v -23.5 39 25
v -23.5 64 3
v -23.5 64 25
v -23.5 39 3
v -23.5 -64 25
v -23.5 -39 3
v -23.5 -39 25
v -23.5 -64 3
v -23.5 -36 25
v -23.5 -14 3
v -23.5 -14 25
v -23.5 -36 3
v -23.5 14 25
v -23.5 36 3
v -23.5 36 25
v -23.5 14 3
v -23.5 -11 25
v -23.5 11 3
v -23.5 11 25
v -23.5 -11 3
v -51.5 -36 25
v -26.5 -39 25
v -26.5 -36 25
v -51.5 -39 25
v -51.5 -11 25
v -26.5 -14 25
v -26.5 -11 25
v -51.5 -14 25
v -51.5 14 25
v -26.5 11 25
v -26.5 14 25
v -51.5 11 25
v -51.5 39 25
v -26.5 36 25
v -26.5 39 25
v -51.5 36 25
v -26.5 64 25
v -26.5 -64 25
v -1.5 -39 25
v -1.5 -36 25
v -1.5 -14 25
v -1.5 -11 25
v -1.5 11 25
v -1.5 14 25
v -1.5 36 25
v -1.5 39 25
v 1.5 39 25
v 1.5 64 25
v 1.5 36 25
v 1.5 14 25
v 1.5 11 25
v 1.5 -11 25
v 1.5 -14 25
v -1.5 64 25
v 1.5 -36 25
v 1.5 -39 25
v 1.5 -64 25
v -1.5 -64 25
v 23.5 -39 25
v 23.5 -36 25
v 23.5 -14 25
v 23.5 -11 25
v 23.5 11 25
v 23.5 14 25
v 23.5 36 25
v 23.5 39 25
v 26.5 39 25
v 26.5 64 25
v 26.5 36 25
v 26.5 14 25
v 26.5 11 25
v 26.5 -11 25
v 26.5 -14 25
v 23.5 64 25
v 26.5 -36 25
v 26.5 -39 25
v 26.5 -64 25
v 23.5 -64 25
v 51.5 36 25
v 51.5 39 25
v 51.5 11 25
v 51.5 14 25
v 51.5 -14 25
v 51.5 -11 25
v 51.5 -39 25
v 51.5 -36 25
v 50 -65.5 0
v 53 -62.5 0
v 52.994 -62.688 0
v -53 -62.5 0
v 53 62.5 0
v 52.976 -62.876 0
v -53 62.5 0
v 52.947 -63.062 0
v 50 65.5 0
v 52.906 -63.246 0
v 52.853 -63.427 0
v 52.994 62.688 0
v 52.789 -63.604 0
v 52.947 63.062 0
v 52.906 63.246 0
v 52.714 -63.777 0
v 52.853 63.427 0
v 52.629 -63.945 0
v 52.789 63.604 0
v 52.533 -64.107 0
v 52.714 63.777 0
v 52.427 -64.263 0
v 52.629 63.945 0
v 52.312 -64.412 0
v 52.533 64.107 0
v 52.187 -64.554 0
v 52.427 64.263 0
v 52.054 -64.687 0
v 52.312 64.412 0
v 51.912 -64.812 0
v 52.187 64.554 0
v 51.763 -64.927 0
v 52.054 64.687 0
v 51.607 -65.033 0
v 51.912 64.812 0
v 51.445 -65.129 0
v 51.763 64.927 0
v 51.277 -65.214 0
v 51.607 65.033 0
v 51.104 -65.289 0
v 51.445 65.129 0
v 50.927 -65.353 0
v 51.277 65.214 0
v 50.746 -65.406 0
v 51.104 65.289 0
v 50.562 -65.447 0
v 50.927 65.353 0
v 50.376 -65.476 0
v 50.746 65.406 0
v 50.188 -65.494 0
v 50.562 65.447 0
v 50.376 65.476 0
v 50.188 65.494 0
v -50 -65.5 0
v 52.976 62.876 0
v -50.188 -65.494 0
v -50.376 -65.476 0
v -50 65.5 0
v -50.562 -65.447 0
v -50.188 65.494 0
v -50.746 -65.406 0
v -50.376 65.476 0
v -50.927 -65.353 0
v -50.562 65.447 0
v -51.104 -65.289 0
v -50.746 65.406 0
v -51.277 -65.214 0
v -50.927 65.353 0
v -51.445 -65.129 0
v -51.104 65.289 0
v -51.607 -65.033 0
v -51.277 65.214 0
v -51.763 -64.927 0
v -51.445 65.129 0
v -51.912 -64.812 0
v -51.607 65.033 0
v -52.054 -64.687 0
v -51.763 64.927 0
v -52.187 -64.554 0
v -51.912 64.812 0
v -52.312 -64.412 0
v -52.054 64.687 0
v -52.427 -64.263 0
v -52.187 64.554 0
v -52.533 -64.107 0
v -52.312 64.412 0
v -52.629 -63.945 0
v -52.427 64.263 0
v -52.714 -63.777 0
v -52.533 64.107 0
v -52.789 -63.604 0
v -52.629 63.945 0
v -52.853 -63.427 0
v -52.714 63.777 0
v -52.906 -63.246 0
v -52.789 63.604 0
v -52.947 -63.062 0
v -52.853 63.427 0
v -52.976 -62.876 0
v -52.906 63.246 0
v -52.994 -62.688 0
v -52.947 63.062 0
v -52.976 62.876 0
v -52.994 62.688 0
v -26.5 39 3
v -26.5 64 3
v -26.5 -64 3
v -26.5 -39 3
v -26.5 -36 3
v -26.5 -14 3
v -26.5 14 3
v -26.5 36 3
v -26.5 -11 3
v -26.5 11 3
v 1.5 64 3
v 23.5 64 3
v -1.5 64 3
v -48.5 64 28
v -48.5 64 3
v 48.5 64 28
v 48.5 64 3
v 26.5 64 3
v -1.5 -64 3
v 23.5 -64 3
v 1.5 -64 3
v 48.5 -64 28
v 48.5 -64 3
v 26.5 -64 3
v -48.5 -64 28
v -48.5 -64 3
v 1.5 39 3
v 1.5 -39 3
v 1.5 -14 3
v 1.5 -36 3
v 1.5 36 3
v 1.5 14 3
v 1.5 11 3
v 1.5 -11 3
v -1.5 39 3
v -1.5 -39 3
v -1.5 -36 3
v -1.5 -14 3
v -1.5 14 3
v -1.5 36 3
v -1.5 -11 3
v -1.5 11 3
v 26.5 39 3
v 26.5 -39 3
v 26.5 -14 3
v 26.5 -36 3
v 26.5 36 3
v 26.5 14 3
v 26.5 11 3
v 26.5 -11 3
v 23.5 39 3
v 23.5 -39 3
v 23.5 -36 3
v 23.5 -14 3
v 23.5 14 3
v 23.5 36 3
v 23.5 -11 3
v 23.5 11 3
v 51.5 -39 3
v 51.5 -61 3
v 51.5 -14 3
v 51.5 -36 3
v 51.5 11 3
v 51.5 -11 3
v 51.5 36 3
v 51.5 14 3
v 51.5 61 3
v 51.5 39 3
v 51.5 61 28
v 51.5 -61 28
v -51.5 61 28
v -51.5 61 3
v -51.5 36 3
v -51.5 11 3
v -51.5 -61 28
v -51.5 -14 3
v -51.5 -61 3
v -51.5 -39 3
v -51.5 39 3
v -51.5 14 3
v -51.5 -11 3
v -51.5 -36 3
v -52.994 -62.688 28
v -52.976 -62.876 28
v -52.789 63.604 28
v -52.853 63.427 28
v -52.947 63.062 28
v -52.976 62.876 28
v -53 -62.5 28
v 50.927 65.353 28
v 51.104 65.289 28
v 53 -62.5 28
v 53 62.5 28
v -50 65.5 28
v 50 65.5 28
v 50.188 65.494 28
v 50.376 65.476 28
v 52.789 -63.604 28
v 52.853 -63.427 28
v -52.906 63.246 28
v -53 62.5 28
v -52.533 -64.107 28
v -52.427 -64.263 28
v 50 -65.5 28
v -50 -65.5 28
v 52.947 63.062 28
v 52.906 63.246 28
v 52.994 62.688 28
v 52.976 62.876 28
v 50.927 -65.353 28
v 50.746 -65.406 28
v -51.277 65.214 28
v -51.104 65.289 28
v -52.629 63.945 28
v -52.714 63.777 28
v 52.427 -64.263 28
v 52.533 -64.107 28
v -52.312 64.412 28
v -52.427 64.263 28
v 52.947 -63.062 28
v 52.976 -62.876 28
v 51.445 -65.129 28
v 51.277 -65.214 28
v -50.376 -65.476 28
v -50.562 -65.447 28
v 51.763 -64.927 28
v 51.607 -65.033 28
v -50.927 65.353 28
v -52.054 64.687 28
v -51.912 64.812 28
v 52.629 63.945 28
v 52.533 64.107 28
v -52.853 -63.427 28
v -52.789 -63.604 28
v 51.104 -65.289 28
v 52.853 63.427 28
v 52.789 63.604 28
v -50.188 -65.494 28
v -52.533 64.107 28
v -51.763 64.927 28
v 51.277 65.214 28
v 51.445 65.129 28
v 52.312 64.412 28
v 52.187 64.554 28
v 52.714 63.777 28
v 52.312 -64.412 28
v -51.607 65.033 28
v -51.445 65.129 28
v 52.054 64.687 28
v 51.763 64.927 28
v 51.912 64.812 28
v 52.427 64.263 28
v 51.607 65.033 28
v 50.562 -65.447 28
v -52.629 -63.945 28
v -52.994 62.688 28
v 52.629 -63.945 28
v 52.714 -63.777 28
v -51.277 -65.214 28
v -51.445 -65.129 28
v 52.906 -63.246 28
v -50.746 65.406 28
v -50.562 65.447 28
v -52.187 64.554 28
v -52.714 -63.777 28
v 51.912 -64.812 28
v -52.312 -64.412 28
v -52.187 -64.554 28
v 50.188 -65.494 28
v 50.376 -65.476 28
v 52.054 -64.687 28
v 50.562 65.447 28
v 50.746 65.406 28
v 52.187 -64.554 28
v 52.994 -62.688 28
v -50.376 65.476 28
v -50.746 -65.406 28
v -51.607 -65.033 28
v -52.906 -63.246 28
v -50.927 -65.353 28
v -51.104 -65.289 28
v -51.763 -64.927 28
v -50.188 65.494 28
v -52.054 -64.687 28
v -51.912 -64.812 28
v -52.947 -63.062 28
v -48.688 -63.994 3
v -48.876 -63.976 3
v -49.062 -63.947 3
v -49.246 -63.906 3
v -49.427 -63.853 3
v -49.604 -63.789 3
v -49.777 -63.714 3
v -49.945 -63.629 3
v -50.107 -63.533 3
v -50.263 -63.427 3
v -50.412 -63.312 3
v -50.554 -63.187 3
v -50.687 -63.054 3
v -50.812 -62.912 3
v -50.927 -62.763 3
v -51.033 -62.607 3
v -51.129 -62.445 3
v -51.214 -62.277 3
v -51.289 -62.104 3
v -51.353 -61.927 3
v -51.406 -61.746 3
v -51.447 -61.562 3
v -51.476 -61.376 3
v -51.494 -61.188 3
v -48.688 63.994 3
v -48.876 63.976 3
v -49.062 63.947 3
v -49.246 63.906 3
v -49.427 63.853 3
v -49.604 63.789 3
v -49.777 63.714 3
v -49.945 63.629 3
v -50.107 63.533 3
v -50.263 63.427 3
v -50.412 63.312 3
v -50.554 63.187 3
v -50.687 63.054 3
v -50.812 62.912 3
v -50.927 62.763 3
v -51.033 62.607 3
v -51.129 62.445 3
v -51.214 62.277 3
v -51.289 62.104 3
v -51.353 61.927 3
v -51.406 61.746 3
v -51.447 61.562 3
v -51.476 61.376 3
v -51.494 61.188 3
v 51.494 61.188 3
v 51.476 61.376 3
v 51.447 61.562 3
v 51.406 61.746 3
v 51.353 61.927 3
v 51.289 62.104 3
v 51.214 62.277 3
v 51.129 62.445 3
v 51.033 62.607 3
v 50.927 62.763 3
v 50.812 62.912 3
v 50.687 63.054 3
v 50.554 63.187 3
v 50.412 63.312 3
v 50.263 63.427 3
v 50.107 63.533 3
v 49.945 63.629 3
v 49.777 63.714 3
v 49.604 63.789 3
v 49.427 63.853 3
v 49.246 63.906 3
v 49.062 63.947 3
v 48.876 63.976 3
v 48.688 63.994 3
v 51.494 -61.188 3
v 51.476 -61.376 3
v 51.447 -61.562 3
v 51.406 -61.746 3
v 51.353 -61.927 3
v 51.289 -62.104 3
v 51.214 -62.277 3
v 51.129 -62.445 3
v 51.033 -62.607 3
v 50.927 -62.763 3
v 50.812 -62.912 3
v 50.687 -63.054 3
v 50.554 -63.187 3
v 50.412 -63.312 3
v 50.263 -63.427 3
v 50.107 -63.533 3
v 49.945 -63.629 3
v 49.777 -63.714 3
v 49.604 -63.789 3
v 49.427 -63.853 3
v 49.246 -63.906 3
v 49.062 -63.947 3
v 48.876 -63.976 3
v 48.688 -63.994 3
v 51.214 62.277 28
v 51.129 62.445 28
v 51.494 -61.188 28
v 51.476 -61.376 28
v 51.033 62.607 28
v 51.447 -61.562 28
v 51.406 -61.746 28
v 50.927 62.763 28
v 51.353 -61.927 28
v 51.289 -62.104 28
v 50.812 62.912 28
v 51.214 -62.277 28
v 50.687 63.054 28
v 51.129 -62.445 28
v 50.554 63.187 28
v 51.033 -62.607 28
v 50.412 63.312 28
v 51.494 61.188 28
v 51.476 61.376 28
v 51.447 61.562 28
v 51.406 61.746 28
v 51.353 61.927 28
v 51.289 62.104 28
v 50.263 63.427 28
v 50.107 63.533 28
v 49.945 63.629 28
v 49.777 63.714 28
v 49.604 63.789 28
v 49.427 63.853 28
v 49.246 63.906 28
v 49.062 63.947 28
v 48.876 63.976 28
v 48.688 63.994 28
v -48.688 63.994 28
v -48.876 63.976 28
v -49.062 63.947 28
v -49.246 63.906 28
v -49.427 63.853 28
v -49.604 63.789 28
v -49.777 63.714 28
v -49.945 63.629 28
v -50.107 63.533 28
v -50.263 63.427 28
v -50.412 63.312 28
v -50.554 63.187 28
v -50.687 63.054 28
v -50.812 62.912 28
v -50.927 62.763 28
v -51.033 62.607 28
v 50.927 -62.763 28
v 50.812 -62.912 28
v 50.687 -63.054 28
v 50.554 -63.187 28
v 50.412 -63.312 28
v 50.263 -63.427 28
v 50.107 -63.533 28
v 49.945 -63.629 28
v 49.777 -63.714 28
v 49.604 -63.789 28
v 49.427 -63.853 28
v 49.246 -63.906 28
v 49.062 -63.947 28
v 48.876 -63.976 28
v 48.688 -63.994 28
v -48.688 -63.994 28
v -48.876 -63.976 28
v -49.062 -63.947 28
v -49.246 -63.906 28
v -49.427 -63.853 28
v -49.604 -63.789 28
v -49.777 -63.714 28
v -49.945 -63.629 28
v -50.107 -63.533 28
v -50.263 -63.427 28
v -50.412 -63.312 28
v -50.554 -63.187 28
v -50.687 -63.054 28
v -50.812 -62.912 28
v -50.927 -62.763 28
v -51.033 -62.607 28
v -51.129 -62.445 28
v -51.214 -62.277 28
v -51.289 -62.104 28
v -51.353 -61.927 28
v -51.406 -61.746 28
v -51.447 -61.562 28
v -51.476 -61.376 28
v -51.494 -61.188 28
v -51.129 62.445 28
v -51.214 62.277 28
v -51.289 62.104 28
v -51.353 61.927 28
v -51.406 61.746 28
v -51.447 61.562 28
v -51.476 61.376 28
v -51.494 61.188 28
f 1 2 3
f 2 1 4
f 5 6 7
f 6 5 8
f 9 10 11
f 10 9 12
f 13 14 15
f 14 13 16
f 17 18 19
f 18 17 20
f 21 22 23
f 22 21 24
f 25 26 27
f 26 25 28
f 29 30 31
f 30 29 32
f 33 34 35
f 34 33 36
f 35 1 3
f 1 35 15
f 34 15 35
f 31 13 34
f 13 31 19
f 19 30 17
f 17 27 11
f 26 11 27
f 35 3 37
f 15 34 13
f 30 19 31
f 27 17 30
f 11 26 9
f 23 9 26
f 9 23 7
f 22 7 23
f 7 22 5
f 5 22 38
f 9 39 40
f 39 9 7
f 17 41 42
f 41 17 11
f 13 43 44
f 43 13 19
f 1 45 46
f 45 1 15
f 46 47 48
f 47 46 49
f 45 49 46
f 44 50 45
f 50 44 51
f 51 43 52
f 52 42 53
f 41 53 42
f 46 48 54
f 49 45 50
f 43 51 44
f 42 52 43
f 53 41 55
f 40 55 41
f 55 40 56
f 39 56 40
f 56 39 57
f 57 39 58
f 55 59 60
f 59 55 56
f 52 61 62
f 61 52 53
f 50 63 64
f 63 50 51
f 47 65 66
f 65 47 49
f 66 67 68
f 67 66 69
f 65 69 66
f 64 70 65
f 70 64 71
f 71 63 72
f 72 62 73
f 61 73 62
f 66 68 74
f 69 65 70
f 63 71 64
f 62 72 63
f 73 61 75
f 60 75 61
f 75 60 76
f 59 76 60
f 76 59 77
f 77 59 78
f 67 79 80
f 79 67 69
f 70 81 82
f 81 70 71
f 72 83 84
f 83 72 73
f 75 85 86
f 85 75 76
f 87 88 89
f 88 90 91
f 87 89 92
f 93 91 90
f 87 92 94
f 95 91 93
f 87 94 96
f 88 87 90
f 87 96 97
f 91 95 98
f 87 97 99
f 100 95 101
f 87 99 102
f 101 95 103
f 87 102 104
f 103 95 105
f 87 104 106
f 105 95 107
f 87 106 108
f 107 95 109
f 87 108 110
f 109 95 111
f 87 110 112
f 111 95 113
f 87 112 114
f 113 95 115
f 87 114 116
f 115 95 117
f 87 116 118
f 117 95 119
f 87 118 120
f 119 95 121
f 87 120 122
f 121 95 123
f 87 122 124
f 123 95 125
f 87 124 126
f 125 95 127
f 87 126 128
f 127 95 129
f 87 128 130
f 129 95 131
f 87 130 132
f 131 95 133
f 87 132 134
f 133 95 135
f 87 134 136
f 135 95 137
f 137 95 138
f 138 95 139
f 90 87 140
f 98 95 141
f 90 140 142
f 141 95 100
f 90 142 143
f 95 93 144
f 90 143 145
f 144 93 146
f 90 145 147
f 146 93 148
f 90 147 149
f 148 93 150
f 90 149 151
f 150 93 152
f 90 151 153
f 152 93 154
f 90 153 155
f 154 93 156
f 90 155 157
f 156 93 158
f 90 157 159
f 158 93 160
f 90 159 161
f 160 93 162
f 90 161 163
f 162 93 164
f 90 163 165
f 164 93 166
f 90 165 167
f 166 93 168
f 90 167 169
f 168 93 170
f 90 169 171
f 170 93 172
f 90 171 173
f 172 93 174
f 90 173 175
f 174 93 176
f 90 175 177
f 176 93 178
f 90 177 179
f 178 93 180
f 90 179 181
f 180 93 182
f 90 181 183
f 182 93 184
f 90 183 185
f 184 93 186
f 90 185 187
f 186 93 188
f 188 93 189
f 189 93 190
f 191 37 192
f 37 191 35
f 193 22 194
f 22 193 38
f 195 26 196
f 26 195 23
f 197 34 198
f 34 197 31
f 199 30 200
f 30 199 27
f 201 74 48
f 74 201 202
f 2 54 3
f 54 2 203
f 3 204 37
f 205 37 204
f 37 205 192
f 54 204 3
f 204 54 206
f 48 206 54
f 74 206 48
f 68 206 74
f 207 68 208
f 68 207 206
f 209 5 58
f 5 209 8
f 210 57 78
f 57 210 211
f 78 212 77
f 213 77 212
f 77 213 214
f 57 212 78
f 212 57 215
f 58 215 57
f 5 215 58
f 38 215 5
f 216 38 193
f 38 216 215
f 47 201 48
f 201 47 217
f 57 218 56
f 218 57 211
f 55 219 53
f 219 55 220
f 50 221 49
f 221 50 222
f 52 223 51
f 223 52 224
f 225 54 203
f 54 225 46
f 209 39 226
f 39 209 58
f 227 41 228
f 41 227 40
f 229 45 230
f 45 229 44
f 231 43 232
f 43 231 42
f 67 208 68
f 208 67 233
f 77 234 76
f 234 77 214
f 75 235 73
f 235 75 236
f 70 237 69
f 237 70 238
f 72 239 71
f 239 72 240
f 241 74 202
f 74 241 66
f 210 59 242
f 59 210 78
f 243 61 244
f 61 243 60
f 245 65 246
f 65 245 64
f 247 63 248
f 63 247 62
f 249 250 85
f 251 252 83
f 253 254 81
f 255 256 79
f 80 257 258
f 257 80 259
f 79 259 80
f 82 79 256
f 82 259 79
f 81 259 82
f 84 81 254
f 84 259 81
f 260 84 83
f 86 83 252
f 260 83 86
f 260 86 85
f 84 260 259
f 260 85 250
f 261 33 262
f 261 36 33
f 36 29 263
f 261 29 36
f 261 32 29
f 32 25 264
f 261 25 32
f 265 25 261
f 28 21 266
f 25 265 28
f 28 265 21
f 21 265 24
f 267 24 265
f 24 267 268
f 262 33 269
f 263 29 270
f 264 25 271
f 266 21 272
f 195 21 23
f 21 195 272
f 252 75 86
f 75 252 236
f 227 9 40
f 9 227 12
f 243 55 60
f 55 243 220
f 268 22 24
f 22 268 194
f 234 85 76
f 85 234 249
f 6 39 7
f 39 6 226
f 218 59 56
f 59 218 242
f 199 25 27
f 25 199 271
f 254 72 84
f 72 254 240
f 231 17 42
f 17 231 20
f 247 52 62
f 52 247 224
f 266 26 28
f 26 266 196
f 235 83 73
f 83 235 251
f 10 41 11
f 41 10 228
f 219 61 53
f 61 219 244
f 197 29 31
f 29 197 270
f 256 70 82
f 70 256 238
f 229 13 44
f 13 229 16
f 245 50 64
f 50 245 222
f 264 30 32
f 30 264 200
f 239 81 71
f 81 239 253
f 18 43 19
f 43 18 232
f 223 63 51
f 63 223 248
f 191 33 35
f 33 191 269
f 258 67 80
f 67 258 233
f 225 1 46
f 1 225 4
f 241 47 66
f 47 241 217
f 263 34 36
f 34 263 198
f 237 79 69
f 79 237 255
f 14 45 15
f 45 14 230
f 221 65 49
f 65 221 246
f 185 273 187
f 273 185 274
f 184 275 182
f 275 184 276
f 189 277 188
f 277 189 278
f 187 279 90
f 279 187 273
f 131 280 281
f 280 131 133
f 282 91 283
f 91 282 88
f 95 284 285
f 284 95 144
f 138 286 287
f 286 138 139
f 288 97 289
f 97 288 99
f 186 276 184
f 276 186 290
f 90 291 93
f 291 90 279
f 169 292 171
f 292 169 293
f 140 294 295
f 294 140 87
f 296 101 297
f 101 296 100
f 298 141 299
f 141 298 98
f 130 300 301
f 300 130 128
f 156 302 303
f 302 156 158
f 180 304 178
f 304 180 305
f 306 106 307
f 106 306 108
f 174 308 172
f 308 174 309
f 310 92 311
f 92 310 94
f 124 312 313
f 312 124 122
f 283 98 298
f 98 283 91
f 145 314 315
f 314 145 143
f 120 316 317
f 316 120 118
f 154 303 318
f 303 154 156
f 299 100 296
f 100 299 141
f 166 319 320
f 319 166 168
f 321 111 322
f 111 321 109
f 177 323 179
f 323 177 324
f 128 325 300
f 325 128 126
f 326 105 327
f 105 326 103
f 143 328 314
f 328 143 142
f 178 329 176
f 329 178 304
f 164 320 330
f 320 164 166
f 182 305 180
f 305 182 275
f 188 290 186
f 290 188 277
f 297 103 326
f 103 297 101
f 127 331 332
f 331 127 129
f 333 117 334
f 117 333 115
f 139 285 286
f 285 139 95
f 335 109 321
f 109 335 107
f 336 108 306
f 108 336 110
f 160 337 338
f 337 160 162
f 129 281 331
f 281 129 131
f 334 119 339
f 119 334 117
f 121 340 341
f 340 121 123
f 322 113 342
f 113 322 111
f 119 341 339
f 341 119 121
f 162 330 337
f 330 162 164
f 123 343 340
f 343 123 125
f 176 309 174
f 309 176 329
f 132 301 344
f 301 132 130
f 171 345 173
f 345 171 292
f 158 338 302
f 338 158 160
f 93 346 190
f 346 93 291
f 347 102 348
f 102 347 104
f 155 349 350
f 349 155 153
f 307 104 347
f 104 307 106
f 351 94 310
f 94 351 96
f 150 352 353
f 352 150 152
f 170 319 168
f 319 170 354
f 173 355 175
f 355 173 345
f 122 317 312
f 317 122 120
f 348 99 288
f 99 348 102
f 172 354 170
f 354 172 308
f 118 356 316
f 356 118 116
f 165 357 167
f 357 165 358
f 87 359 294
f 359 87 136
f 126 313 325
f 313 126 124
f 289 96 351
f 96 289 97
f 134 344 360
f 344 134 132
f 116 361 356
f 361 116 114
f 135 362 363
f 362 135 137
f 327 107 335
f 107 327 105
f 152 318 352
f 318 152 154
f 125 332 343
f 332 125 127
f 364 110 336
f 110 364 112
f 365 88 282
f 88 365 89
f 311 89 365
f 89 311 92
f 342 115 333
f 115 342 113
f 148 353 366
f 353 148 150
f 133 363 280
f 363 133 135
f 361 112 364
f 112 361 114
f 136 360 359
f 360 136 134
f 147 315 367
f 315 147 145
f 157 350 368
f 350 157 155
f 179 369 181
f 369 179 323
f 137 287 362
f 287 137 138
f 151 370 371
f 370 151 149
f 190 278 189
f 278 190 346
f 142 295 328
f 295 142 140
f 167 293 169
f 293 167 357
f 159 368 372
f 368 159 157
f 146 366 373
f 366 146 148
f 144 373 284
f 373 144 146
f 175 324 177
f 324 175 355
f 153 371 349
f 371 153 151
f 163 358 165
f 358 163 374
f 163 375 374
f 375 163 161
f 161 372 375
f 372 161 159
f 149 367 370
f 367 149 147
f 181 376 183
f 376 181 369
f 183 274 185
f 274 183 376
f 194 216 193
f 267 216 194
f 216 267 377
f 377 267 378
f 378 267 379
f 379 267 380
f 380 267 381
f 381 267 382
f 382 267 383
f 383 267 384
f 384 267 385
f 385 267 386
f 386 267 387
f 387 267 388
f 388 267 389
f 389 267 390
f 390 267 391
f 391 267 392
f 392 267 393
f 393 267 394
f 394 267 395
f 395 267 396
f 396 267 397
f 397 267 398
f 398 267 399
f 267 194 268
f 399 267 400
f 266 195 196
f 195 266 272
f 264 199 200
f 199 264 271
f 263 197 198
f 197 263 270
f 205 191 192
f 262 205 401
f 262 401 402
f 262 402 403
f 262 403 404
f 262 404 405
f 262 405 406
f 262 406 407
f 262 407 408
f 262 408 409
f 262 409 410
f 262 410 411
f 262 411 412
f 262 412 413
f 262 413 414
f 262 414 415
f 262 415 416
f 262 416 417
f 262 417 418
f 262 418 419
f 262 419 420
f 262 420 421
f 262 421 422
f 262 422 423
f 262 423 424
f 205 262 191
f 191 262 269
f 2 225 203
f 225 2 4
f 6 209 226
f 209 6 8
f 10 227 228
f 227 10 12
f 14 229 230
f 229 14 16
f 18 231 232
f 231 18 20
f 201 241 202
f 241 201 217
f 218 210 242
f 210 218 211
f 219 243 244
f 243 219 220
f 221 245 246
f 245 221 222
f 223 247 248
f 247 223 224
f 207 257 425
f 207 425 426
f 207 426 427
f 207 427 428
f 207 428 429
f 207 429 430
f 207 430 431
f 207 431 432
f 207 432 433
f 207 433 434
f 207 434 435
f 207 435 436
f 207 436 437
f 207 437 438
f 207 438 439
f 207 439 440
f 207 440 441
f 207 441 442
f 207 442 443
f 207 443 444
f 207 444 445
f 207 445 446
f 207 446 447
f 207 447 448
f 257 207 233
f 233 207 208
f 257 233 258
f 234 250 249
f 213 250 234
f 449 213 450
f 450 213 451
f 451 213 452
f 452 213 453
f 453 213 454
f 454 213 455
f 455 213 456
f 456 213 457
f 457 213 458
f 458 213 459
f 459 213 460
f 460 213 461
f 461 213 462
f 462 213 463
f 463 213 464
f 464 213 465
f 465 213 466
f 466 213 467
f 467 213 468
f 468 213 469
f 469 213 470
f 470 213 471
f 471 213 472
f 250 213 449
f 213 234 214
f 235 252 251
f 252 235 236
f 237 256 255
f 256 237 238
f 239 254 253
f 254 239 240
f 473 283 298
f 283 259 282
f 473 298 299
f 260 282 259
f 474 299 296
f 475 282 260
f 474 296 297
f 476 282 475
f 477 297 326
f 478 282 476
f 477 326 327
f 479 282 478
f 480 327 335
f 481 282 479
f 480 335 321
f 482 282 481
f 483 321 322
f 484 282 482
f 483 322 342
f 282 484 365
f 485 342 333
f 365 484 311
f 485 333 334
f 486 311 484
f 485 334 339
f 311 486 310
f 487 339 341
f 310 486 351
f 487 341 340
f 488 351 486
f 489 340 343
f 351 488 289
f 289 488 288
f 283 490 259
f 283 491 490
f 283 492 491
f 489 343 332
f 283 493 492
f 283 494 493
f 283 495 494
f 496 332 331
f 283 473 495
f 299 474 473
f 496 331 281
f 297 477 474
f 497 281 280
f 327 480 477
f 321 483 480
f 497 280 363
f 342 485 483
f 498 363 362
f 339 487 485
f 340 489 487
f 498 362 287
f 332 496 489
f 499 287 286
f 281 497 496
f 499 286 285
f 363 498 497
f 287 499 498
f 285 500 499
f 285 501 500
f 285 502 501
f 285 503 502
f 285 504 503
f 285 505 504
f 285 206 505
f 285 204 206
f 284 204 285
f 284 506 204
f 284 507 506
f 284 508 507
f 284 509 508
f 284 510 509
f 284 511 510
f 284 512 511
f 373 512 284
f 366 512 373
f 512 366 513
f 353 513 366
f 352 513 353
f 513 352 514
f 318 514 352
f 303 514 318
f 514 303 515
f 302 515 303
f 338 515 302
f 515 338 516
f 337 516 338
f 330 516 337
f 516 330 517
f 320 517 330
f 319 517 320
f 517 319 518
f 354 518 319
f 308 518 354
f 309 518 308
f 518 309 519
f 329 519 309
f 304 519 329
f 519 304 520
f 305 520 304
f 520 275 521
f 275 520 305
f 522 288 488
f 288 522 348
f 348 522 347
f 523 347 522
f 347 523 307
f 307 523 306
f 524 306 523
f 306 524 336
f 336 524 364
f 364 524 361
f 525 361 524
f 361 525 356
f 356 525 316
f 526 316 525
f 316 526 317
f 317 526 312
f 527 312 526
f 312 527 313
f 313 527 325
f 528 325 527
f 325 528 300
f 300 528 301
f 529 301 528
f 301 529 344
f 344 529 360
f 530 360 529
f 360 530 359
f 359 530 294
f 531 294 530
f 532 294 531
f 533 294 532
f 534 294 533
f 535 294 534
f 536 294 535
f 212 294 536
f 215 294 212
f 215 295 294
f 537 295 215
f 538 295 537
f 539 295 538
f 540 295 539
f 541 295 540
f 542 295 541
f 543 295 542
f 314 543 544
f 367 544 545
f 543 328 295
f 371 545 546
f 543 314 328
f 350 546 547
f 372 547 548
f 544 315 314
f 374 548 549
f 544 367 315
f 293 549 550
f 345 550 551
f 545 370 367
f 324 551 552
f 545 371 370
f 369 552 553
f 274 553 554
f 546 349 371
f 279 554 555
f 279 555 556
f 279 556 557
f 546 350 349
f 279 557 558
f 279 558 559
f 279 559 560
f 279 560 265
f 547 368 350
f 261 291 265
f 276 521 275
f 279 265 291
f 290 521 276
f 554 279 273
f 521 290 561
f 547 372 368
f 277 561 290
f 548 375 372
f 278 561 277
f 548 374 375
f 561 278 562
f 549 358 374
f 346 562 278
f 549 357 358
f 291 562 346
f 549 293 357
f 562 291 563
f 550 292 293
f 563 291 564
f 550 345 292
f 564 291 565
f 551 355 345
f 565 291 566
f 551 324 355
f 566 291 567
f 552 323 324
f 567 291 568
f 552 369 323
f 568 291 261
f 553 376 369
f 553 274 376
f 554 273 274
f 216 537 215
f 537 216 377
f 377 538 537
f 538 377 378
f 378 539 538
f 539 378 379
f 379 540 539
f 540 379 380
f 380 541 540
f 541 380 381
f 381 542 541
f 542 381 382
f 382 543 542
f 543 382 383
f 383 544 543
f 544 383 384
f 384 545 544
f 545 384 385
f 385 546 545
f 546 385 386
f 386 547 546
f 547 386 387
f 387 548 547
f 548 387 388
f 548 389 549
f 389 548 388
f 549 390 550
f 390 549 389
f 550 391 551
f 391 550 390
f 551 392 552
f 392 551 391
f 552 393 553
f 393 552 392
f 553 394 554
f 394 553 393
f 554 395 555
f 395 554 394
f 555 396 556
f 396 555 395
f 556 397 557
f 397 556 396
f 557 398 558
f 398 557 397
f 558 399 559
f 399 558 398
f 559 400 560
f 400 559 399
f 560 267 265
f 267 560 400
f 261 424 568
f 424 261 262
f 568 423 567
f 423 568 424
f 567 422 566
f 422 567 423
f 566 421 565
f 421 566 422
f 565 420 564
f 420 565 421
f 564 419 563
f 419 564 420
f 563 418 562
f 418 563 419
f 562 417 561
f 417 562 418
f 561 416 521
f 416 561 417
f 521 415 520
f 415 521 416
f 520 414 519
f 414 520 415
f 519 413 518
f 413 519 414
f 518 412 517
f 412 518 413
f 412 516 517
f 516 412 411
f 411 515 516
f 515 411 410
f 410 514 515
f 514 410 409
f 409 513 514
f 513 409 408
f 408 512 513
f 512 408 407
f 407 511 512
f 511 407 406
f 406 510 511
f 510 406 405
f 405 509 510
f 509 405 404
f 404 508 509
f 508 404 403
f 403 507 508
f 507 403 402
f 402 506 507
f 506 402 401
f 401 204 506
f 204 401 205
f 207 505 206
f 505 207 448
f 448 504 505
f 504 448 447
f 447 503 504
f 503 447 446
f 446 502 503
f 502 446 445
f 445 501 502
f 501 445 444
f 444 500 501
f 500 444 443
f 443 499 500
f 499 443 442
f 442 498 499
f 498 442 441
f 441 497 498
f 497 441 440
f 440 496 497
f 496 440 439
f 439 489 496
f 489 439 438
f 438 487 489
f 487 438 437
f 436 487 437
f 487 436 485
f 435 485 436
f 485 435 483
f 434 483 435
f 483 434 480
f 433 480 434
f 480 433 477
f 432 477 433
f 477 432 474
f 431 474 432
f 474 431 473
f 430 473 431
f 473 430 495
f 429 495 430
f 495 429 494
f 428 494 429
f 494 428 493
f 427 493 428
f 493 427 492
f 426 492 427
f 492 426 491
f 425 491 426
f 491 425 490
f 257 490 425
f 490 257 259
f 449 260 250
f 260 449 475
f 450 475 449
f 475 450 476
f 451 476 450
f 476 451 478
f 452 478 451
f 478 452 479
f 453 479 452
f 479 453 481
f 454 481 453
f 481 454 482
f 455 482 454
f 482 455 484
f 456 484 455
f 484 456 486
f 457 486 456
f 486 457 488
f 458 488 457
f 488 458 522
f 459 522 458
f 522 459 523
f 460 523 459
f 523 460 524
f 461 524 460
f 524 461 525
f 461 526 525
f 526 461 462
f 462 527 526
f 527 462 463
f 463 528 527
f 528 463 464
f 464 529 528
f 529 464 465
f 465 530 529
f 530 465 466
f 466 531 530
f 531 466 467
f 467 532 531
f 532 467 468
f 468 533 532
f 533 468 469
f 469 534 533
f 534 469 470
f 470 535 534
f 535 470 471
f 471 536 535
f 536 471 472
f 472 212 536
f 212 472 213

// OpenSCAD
$fn = 100;

rows = 5;
cols = 4;

width = 25;
length = 25;
height = 25;

module tray_base(width, length, height, thickness, radius) {
  linear_extrude(height) {
    hull() {
      w = width - radius + thickness;
      l = length - radius + thickness;

      points = [[-w/2, -l/2],
		[ w/2, -l/2],
		[ w/2,  l/2],
		[-w/2,  l/2]];
      for (p = points) {
	translate(p) {
	  circle(radius);
	}
      }
    }
  }
}

module tray_walls(width, length, height, thickness, radius)
{
  linear_extrude(height) {
    difference() {
      hull() {
	w = width - radius + thickness;
	l = length - radius + thickness;

	points = [[-w/2, -l/2],
		  [ w/2, -l/2],
		  [ w/2,  l/2],
		  [-w/2,  l/2]];
	for (p = points) {
	  translate(p) {
	    circle(radius);
	  }
	}
      }

      hull() {
	w = width - radius;
	l = length - radius;

	points = [[-w/2, -l/2],
		  [ w/2, -l/2],
		  [ w/2,  l/2],
		  [-w/2,  l/2]];
	for (p = points) {
	  translate(p) {
	    circle(radius);
	  }
	}
      }
    }
  }
}

module tray_dividers(width, length, height, rows, cols, thickness) {
  total_width = width * cols + thickness;
  total_length = length * rows + thickness;

  for (x = [-total_width / 2 + width:width:total_width / 2 - width]) {
    translate([x, -total_length/2, 0])
      cube([thickness, total_length, height]);
  }

  for (y = [-total_length / 2 + length:length:total_length / 2 - length]) {
    translate([-total_width / 2, y, 0])
      cube([total_width, thickness, height]);
  }
}

module tray(width, length, height, rows, cols, thickness, radius) {
  total_width = width * cols;
  total_length = length * rows;

  tray_base(total_width, total_length, thickness, thickness, radius);

  translate([0, 0, thickness])
    tray_walls(total_width, total_length, height, thickness, radius);

  tray_dividers(width, length, height, rows, cols, thickness);
}

tray(width, length, height, rows, cols, 3, 3);
